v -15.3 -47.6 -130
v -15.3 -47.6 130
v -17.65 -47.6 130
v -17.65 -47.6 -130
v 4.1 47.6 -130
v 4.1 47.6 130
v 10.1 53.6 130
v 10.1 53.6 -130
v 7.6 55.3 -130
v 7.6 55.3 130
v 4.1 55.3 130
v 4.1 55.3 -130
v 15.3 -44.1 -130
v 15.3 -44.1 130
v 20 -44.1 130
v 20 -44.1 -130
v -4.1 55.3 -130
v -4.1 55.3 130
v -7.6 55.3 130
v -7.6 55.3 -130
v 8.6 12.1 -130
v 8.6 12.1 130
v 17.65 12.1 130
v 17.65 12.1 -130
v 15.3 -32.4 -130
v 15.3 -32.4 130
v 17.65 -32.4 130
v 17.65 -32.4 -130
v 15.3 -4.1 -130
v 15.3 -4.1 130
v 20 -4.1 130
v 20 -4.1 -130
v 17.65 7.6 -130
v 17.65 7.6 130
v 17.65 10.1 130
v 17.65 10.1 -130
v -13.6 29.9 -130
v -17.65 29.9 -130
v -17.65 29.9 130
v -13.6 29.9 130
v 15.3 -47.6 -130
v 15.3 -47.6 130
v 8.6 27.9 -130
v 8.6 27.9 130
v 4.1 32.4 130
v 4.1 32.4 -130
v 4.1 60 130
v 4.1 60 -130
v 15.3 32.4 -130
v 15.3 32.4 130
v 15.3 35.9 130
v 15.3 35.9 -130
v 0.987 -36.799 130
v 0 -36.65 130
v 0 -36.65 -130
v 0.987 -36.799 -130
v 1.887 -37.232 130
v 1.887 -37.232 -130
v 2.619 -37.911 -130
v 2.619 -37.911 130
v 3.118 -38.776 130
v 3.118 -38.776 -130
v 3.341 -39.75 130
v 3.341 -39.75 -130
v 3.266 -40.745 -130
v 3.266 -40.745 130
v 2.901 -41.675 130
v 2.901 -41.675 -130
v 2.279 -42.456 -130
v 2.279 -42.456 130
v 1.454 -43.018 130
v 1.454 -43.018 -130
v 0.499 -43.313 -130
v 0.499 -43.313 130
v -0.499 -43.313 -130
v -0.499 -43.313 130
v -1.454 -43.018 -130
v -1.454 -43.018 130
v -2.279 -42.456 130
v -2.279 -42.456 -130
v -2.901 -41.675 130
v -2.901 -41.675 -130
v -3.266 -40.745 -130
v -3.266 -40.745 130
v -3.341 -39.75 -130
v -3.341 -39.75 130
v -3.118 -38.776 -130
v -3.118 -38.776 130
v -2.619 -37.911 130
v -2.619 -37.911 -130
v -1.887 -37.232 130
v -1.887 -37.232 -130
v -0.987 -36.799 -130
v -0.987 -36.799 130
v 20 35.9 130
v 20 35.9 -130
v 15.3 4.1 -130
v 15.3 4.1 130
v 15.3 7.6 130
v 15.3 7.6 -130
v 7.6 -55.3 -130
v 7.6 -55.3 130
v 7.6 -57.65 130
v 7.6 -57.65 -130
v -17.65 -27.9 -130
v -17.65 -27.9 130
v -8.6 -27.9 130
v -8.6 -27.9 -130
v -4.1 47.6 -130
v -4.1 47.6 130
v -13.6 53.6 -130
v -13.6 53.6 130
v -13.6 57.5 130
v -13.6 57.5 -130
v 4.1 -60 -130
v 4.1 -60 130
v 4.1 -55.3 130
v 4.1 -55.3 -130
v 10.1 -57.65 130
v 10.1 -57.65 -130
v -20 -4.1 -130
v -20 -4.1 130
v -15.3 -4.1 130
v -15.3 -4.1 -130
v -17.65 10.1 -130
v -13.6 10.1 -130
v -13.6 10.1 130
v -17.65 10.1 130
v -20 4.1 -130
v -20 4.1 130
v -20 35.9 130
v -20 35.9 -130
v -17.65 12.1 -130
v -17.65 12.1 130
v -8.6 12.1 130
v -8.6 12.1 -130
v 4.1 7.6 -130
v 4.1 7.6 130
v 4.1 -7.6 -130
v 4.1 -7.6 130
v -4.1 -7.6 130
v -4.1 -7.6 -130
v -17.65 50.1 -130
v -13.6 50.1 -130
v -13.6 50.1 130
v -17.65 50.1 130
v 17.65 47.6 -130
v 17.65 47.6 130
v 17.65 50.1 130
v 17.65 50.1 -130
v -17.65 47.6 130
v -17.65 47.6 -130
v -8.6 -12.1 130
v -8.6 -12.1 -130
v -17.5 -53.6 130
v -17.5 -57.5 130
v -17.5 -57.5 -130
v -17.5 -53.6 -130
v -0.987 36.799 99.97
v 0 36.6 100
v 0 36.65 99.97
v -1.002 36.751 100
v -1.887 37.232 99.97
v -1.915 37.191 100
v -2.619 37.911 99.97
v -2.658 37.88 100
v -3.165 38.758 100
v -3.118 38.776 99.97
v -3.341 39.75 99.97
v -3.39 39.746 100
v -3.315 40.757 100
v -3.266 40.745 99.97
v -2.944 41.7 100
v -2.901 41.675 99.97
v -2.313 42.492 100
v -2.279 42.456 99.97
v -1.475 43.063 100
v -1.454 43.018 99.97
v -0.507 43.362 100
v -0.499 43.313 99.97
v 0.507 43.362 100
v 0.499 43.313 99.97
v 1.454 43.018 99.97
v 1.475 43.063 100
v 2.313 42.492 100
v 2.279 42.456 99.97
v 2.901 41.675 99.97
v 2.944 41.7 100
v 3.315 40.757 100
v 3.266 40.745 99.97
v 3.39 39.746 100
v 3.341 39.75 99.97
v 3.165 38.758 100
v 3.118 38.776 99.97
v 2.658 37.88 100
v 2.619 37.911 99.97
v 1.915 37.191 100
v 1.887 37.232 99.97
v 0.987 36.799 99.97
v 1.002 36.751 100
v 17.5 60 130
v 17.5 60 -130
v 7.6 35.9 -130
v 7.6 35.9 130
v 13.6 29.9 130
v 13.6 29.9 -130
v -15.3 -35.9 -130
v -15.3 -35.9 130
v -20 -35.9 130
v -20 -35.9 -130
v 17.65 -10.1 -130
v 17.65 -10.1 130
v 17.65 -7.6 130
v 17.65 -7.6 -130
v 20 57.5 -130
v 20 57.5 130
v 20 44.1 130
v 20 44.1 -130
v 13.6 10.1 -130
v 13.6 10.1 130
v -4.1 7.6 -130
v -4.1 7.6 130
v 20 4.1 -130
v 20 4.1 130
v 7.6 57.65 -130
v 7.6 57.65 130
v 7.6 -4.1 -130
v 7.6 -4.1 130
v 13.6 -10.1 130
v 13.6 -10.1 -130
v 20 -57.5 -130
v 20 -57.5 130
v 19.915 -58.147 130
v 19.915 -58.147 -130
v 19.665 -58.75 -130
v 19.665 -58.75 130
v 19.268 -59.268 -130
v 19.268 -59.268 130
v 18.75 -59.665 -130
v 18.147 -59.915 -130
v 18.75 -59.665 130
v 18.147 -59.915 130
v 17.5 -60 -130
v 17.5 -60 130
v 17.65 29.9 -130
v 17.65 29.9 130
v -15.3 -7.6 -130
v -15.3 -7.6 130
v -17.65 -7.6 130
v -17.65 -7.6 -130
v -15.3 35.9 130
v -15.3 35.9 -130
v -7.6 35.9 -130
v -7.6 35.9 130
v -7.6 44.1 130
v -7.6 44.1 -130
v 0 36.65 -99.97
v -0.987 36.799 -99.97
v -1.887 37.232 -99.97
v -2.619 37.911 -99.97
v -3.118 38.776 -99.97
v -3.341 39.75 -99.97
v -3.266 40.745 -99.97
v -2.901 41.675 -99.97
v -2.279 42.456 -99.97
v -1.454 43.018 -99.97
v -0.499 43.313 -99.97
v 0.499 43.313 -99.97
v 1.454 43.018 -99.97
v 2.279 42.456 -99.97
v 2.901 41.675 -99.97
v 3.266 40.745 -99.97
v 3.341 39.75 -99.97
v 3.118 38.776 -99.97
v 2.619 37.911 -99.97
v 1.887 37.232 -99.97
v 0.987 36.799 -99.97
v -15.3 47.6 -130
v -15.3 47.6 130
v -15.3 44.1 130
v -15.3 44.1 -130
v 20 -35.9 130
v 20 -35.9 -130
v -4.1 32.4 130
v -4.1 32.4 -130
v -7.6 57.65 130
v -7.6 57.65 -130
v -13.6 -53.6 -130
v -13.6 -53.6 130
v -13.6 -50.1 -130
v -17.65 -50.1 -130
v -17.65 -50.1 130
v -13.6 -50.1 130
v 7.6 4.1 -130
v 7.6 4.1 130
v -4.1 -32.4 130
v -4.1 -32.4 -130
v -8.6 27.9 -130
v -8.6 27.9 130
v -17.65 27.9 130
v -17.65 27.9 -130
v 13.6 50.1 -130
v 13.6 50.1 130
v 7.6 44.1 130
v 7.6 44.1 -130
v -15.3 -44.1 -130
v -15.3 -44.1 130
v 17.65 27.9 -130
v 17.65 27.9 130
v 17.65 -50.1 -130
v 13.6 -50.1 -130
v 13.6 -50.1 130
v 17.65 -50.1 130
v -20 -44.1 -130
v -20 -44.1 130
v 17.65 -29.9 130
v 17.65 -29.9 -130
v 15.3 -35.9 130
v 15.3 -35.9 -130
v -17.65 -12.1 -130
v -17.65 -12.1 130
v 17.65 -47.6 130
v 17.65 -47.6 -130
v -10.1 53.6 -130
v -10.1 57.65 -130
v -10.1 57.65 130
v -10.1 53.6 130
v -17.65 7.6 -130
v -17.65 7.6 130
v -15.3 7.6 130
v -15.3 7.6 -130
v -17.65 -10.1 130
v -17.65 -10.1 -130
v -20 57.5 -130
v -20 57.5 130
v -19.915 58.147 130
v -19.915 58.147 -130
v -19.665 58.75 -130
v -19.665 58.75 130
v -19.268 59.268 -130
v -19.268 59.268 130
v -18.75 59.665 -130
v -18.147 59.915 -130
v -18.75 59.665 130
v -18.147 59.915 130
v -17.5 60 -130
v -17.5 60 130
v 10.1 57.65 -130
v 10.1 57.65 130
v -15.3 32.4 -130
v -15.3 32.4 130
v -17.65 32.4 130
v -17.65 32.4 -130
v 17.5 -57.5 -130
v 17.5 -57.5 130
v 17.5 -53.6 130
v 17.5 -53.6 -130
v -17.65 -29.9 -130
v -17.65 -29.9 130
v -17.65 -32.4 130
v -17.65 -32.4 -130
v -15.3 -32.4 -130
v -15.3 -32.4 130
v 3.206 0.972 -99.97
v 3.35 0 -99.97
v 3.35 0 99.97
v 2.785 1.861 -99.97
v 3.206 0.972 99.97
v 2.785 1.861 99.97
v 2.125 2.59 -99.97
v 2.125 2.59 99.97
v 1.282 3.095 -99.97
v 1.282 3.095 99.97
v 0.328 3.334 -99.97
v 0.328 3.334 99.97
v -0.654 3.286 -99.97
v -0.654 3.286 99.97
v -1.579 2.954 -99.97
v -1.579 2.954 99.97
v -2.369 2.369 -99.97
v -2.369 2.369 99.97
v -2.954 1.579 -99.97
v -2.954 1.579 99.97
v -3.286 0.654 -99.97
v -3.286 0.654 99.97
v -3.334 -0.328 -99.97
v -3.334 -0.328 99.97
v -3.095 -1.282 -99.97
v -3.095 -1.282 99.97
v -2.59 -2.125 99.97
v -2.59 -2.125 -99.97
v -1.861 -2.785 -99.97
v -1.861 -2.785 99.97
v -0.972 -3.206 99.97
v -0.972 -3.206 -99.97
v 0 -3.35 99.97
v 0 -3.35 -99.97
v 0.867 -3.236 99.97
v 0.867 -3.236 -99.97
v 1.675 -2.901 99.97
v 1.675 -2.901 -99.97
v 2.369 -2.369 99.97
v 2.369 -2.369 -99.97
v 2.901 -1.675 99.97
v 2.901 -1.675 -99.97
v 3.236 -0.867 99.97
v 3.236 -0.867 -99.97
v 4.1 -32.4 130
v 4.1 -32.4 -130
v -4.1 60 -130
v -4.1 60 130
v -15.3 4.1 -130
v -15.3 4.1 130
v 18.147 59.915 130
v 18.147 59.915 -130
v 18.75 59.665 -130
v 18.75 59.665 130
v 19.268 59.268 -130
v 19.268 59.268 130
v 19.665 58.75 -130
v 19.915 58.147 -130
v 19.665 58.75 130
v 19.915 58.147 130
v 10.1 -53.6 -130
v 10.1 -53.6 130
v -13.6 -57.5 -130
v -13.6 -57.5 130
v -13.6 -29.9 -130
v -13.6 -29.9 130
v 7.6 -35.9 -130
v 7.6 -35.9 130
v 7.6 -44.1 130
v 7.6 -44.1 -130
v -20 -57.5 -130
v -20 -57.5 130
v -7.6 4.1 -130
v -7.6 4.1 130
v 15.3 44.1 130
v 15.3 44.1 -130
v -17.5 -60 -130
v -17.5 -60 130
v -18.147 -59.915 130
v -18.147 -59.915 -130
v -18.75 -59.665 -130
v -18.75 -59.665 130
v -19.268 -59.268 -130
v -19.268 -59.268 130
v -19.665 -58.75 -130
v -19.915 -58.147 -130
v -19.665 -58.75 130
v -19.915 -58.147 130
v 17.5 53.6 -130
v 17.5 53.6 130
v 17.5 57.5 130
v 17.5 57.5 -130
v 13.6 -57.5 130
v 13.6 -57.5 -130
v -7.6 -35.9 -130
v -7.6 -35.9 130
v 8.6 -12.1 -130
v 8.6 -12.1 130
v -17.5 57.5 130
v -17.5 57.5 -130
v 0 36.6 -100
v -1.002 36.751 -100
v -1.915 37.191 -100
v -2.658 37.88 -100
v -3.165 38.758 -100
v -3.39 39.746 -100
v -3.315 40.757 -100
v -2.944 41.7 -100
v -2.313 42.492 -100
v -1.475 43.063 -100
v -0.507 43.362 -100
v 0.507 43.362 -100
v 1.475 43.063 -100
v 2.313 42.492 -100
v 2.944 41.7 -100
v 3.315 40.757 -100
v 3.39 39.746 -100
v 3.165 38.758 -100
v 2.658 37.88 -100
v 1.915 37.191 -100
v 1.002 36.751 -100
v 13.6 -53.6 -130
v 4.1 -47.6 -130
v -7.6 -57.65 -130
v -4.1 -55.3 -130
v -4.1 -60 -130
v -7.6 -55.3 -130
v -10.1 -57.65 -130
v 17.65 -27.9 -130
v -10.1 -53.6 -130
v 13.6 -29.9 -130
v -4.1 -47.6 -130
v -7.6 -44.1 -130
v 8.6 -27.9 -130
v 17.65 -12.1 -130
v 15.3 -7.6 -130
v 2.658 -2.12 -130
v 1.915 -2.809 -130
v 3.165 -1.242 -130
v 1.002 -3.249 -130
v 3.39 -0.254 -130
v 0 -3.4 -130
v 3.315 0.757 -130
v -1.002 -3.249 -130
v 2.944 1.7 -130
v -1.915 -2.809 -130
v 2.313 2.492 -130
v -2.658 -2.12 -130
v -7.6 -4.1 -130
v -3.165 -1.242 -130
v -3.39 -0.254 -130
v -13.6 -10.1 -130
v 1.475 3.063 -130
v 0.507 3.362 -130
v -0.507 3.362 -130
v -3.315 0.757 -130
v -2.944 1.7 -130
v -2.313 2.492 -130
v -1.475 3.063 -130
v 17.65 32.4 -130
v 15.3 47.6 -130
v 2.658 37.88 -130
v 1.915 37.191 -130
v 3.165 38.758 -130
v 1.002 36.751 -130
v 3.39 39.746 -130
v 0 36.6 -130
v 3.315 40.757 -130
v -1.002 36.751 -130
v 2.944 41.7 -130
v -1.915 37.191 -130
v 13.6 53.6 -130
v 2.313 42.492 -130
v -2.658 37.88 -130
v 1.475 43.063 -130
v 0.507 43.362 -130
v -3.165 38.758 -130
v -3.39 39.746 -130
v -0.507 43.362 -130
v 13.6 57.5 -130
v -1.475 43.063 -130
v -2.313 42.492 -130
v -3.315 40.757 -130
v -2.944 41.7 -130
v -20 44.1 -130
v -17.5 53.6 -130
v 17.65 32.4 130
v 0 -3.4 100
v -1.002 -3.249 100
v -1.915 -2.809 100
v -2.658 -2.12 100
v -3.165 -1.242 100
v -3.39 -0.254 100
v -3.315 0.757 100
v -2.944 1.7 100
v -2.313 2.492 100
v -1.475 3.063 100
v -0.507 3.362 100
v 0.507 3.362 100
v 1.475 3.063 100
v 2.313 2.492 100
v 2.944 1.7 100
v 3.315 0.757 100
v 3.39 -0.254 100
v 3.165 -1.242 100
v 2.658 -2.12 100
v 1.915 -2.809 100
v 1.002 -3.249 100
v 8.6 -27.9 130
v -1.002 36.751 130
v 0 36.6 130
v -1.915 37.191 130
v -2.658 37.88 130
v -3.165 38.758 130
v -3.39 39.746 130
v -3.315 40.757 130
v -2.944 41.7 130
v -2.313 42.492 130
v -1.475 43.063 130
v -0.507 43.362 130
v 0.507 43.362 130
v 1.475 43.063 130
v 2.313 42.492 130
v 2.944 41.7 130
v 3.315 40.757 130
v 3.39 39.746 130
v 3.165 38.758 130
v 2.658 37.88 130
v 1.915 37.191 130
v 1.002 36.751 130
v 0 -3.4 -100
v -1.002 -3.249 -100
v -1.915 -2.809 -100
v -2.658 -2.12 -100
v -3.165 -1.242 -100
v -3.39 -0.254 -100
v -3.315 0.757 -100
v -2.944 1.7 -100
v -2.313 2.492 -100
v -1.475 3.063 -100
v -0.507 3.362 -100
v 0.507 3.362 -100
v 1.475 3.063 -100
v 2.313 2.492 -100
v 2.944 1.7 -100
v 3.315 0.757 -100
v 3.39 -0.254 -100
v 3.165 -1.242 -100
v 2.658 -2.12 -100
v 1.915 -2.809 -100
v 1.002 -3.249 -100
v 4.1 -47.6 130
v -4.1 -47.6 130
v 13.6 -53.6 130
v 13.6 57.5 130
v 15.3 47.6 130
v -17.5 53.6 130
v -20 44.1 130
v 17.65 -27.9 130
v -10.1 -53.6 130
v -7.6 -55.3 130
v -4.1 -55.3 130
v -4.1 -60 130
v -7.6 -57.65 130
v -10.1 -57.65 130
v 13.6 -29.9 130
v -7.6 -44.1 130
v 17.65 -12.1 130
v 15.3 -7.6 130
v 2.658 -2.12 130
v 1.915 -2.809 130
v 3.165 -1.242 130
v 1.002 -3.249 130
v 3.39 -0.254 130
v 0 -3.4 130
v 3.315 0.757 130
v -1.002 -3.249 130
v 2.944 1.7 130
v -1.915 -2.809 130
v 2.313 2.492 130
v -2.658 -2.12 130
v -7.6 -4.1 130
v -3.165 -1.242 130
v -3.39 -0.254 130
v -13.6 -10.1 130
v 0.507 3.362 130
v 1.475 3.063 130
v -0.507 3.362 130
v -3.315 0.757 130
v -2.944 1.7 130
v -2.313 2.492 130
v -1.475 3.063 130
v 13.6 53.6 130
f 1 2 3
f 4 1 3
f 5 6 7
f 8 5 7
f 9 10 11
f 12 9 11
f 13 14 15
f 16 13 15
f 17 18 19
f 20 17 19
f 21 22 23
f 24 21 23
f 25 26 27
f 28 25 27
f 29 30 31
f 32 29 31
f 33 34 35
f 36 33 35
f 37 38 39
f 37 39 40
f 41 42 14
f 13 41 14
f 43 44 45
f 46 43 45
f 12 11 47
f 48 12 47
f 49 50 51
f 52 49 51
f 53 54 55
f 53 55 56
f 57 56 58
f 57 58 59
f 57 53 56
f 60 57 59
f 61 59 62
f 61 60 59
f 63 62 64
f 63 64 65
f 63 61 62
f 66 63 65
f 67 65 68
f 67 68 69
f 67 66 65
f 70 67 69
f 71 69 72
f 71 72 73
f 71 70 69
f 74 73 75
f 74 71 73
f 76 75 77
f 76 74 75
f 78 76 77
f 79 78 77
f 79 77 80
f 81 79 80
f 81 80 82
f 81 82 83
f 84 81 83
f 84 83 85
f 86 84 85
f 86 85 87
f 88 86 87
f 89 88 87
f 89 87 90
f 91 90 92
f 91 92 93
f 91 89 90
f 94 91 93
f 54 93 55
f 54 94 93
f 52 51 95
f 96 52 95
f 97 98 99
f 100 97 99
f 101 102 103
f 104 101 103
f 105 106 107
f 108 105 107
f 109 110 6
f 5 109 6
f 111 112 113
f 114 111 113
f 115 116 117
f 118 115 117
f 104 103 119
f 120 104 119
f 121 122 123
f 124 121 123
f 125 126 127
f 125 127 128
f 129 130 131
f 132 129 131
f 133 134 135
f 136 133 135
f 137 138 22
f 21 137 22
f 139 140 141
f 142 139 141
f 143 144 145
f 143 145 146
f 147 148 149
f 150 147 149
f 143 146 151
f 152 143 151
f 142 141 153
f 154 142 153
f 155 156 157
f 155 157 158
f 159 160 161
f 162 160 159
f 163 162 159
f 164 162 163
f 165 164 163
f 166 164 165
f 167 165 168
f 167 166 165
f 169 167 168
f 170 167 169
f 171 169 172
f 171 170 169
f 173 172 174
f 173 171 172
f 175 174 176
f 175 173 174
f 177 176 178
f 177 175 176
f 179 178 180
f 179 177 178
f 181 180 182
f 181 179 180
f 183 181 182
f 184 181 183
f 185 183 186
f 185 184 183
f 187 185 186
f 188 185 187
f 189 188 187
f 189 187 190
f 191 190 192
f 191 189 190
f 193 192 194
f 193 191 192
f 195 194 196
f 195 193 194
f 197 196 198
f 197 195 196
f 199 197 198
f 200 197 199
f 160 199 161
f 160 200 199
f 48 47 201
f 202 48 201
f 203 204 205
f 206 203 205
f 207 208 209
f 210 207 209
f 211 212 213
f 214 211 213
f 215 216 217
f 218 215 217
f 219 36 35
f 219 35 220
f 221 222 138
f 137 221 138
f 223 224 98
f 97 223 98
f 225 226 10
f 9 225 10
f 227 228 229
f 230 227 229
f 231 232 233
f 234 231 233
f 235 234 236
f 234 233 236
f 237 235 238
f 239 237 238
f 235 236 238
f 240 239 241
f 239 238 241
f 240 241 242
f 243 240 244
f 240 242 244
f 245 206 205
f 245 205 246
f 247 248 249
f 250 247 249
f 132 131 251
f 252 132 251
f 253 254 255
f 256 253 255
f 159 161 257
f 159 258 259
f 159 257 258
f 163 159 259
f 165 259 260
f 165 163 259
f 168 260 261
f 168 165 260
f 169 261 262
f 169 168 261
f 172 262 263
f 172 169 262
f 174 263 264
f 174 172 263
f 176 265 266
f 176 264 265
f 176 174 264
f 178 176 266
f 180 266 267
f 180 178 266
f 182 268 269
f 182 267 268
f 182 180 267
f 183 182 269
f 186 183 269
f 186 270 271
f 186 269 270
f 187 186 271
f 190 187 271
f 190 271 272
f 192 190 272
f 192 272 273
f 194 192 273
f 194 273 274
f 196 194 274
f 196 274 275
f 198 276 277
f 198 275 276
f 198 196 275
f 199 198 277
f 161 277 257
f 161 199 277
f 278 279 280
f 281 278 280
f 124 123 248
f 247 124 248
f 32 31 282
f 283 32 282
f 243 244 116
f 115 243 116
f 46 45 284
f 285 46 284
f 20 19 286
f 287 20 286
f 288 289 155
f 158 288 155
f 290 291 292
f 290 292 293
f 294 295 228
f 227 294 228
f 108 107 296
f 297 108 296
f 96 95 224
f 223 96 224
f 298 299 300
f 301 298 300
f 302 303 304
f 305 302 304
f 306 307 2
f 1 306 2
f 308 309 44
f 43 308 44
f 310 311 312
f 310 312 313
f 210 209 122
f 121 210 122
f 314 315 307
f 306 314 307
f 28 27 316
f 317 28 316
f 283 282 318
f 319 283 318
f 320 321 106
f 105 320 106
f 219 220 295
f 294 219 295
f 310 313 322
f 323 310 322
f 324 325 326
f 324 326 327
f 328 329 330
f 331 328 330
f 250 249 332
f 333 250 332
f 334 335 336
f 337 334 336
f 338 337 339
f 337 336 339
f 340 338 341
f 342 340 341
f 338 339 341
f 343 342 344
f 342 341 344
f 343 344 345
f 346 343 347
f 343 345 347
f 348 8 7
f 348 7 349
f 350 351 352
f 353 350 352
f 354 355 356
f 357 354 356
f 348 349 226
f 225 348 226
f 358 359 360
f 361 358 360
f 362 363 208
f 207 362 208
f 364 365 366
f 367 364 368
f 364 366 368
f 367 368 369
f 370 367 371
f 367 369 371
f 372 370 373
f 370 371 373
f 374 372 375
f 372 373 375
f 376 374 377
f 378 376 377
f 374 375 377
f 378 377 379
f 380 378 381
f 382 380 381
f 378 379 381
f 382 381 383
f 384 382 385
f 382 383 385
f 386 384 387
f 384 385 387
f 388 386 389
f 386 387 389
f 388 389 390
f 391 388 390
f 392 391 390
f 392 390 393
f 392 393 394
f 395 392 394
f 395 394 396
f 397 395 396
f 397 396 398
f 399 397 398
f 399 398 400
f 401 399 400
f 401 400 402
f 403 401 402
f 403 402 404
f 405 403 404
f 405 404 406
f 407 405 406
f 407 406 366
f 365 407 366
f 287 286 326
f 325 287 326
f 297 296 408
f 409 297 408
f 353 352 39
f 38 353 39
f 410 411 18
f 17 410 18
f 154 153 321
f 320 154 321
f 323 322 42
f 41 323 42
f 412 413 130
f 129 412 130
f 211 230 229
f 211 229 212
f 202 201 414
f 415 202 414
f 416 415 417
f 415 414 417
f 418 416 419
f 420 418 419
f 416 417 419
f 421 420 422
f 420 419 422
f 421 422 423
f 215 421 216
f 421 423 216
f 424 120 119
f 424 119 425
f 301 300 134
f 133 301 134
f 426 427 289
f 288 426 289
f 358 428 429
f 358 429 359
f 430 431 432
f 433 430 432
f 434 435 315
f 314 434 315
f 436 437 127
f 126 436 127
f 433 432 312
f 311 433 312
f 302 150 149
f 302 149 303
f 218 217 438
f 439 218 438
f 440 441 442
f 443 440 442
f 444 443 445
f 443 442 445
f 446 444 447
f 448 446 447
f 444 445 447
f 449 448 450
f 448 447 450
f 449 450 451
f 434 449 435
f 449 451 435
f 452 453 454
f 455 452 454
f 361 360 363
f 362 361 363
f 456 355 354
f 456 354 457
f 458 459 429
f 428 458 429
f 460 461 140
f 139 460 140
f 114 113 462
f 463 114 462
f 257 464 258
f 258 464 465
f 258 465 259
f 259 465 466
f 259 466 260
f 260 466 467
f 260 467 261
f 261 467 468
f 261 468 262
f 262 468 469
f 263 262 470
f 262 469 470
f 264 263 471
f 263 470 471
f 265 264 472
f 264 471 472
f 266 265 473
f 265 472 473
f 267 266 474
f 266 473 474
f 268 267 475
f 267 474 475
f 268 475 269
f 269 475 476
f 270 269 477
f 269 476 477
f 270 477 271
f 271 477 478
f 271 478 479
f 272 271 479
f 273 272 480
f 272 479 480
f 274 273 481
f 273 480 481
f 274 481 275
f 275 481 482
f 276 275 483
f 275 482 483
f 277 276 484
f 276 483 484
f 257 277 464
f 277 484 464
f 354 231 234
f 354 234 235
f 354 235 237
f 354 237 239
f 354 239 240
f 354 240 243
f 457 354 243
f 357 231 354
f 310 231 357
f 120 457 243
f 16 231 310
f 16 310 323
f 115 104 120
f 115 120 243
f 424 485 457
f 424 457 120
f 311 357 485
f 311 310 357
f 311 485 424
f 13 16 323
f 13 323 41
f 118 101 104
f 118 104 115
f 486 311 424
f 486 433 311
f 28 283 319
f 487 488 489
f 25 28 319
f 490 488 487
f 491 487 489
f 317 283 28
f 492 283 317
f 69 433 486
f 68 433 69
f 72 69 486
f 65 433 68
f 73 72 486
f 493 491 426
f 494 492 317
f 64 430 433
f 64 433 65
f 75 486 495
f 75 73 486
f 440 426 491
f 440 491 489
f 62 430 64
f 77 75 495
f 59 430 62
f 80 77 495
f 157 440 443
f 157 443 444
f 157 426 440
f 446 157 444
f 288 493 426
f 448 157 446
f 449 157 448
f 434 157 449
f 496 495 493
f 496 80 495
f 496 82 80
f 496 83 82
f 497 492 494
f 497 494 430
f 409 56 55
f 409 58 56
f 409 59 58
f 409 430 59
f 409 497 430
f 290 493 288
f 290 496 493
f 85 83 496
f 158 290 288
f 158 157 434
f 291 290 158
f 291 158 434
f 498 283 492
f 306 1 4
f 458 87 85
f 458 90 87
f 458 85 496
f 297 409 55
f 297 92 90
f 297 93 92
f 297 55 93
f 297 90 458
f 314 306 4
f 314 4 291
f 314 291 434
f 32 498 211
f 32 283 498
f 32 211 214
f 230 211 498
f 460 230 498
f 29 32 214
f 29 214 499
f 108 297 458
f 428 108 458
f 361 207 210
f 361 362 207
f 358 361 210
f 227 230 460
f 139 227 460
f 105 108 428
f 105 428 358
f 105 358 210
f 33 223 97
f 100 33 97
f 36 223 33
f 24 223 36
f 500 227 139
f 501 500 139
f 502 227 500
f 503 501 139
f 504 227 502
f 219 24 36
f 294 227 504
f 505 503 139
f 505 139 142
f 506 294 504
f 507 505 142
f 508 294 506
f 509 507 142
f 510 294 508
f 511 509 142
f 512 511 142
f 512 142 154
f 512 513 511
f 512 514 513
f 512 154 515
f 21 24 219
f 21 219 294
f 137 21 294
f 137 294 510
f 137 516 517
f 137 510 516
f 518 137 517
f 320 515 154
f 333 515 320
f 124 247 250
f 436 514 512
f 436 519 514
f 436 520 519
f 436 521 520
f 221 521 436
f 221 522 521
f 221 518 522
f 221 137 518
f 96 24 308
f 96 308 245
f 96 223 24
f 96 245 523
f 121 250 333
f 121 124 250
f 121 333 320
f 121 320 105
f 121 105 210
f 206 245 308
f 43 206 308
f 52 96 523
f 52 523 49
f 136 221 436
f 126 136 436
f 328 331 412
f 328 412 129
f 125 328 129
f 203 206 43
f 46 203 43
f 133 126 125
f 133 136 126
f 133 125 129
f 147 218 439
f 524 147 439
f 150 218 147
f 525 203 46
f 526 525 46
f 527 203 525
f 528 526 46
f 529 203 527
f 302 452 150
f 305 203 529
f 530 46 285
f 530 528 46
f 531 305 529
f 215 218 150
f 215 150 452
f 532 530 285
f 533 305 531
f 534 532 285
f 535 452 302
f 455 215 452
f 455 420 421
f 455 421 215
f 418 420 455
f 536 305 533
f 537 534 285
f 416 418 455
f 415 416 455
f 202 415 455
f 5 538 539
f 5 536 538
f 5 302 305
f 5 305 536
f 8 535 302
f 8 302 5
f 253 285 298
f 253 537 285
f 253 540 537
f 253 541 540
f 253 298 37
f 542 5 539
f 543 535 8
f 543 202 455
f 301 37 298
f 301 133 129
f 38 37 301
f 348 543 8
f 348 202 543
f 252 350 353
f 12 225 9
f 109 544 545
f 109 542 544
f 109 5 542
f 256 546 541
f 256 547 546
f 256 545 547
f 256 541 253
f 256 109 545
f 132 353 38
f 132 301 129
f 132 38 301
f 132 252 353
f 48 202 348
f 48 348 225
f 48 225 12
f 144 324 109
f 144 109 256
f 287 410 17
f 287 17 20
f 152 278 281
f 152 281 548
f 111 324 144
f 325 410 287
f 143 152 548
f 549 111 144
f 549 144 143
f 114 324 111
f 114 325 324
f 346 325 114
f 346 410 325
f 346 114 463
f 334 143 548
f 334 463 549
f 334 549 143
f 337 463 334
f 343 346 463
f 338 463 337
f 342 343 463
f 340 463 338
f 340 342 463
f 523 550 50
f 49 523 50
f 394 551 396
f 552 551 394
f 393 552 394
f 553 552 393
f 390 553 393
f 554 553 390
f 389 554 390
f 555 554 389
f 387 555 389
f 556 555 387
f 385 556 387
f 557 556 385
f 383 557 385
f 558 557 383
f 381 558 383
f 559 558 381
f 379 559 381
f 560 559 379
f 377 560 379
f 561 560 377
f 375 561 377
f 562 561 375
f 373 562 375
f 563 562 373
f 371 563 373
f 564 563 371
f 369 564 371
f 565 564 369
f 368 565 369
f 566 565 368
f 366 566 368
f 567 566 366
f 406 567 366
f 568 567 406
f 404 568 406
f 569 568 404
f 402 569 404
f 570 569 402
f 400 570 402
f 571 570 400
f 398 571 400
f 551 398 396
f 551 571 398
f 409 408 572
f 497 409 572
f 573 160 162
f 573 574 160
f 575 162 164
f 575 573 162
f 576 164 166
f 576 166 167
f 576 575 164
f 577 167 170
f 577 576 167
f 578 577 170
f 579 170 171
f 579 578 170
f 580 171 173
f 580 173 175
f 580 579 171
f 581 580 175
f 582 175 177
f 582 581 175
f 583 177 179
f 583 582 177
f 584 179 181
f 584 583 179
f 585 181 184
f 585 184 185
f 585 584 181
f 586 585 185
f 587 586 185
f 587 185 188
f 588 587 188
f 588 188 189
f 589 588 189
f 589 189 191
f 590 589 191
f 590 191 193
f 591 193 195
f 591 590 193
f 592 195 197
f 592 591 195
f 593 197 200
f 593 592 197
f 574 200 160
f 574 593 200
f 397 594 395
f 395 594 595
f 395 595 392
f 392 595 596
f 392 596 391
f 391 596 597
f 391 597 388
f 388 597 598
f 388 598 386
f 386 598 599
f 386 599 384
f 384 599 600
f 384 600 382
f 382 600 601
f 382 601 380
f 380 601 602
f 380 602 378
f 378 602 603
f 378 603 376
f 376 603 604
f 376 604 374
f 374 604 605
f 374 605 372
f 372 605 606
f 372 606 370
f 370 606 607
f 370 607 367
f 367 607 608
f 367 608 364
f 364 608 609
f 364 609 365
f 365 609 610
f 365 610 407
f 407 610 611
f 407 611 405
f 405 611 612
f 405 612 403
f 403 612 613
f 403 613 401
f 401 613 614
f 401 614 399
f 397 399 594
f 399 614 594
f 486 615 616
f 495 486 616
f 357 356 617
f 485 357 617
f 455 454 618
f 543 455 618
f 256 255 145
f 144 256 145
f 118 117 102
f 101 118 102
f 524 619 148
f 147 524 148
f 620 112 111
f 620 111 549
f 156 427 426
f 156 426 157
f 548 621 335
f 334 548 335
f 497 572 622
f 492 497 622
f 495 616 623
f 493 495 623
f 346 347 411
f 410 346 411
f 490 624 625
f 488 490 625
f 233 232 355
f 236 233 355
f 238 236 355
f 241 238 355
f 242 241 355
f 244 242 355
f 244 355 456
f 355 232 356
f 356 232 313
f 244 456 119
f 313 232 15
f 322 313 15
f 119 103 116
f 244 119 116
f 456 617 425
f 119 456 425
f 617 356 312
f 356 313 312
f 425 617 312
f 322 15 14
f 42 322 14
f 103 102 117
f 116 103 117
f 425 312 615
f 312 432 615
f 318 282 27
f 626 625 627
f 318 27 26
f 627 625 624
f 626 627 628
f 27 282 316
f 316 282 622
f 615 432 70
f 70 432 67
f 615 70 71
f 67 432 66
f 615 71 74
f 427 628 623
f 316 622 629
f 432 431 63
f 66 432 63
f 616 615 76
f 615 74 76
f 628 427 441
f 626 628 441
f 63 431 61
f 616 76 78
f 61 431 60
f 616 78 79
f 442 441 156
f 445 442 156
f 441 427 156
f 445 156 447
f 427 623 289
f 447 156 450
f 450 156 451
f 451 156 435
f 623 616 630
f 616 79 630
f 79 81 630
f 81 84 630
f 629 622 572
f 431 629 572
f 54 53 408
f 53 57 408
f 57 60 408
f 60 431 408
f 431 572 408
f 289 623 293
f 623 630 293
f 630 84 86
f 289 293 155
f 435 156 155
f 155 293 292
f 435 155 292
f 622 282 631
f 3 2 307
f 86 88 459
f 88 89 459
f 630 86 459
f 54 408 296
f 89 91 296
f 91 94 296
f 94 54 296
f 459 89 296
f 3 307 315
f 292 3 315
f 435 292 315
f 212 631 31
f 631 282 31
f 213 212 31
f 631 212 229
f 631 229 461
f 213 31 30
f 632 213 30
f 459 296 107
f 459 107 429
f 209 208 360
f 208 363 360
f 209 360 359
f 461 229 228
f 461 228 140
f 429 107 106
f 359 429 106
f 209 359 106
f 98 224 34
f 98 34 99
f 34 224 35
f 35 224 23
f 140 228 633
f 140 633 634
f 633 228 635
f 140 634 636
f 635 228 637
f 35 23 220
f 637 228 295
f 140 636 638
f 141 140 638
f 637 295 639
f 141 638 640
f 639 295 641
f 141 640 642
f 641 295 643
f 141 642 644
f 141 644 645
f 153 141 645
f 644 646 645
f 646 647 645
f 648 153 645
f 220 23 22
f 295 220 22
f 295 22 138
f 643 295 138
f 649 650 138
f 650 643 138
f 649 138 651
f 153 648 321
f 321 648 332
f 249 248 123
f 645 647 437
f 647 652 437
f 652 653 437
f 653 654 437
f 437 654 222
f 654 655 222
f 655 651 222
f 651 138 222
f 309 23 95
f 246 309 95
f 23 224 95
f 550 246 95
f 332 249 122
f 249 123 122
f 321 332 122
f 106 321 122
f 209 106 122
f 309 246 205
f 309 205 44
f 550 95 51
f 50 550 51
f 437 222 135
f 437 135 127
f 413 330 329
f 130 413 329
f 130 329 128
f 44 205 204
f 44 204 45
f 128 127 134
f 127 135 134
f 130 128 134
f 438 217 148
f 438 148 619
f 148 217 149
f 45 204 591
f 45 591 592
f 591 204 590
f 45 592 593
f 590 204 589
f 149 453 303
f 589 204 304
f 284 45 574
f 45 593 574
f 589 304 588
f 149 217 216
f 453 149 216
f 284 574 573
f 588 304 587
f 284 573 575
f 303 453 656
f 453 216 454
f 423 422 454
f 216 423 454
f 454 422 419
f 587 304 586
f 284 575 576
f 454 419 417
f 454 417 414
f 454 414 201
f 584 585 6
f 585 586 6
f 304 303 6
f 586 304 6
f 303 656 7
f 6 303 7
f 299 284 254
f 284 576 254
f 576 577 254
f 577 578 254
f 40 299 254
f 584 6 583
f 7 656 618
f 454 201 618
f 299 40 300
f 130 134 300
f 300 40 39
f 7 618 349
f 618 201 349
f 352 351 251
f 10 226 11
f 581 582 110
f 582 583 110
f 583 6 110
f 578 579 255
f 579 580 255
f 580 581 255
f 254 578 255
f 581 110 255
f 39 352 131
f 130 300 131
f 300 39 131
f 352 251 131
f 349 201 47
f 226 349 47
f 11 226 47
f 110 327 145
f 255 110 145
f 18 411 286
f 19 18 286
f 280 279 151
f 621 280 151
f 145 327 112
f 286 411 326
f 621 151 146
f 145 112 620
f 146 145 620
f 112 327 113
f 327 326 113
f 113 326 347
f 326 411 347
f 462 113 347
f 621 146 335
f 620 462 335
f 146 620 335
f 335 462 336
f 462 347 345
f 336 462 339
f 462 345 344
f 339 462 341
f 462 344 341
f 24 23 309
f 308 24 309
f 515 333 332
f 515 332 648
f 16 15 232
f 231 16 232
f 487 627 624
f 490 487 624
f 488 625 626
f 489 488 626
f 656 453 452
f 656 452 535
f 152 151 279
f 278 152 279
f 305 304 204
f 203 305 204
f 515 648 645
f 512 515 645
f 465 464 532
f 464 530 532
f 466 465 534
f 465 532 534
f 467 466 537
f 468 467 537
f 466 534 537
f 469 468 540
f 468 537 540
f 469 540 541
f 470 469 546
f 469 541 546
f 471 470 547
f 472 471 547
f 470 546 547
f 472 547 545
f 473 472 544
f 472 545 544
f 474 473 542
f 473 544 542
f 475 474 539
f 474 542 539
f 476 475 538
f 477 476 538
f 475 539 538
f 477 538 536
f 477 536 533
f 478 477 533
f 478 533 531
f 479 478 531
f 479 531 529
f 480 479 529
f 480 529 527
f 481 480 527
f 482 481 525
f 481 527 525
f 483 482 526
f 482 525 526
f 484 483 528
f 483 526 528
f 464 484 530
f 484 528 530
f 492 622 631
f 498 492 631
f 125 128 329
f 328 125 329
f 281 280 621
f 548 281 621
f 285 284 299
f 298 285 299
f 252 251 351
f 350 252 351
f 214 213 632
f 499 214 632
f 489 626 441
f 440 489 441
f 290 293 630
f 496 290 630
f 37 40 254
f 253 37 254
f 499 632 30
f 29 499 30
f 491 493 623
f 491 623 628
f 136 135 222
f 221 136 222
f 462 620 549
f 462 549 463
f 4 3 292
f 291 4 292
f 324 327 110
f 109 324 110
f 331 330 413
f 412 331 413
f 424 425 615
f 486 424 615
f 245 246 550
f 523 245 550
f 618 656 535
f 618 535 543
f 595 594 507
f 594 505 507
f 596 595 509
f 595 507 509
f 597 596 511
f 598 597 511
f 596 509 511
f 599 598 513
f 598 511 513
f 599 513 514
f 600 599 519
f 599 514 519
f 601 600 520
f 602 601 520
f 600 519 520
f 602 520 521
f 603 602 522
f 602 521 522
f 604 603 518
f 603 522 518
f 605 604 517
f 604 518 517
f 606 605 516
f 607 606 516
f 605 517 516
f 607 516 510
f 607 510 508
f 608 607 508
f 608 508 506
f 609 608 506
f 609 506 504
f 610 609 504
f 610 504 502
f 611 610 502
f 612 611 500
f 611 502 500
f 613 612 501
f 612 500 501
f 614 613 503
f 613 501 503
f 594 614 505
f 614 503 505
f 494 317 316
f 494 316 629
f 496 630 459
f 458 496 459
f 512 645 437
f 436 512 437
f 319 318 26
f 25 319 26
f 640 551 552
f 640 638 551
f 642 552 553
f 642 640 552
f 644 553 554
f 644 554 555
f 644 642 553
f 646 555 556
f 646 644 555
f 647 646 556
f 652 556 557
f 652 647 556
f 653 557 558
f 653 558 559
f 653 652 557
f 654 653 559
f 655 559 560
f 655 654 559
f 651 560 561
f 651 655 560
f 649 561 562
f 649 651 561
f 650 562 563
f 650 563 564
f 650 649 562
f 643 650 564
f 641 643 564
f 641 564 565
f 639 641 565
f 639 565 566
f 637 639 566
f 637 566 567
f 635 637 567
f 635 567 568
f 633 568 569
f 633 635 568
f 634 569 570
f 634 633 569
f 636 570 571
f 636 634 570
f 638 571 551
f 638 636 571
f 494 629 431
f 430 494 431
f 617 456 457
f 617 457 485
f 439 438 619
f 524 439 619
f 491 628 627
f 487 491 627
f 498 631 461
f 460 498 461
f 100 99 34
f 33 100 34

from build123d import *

# Parameters (mm, degrees)
SKETCH22_W                      = 3.9
SKETCH22_H                      = 3.9
F_40_SERIES_TS40_120LM_1_DEPTH  = 260
M8X1_25_TAPPED_HOLE1_AT_2_COUNT = 2
M8X1_25_TAPPED_HOLE1_AT_2_PITCH = 40


with BuildPart() as part:
    # Sketch22 → 40 series TS40-120LM(1) (new body)
    with BuildSketch(Plane(origin=(0, 0, 130), x_dir=(-1, 0, 0), z_dir=(0, 0, -1))):
        with BuildLine():
            Line((15.3, -35.9), (20, -35.9))
            Line((20, -35.9), (20, -4.1))
            Line((20, -4.1), (15.3, -4.1))
            Line((15.3, -4.1), (15.3, -7.6))
            Line((15.3, -7.6), (17.65, -7.6))
            Line((17.65, -7.6), (17.65, -10.1))
            Line((17.65, -10.1), (13.6, -10.1))
            Line((13.6, -10.1), (7.6, -4.1))
            Line((7.6, -4.1), (7.6, 4.1))
            Line((7.6, 4.1), (13.6, 10.1))
            Line((13.6, 10.1), (17.65, 10.1))
            Line((17.65, 10.1), (17.65, 7.6))
            Line((17.65, 7.6), (15.3, 7.6))
            Line((15.3, 7.6), (15.3, 4.1))
            Line((15.3, 4.1), (20, 4.1))
            Line((20, 4.1), (20, 35.9))
            Line((20, 35.9), (15.3, 35.9))
            Line((15.3, 35.9), (15.3, 32.4))
            Line((15.3, 32.4), (17.65, 32.4))
            Line((17.65, 32.4), (17.65, 29.9))
            Line((17.65, 29.9), (13.6, 29.9))
            Line((13.6, 29.9), (7.6, 35.9))
            Line((7.6, 35.9), (7.6, 44.1))
            Line((7.6, 44.1), (13.6, 50.1))
            Line((13.6, 50.1), (17.65, 50.1))
            Line((17.65, 50.1), (17.65, 47.6))
            Line((17.65, 47.6), (15.3, 47.6))
            Line((15.3, 47.6), (15.3, 44.1))
            Line((15.3, 44.1), (20, 44.1))
            Line((20, 44.1), (20, 57.5))
            ThreePointArc((20, 57.5), (19.267766953, 59.267766953), (17.5, 60))
            Line((17.5, 60), (4.1, 60))
            Line((4.1, 60), (4.1, 55.3))
            Line((4.1, 55.3), (7.6, 55.3))
            Line((7.6, 55.3), (7.6, 57.65))
            Line((7.6, 57.65), (10.1, 57.65))
            Line((10.1, 57.65), (10.1, 53.6))
            Line((10.1, 53.6), (4.1, 47.6))
            Line((4.1, 47.6), (-4.1, 47.6))
            Line((-4.1, 47.6), (-10.1, 53.6))
            Line((-10.1, 53.6), (-10.1, 57.65))
            Line((-10.1, 57.65), (-7.6, 57.65))
            Line((-7.6, 57.65), (-7.6, 55.3))
            Line((-7.6, 55.3), (-4.1, 55.3))
            Line((-4.1, 55.3), (-4.1, 60))
            Line((-4.1, 60), (-17.5, 60))
            ThreePointArc((-17.5, 60), (-19.267766953, 59.267766953), (-20, 57.5))
            Line((-20, 57.5), (-20, 44.1))
            Line((-20, 44.1), (-15.3, 44.1))
            Line((-15.3, 44.1), (-15.3, 47.6))
            Line((-15.3, 47.6), (-17.65, 47.6))
            Line((-17.65, 47.6), (-17.65, 50.1))
            Line((-17.65, 50.1), (-13.6, 50.1))
            Line((-13.6, 50.1), (-7.6, 44.1))
            Line((-7.6, 44.1), (-7.6, 35.9))
            Line((-7.6, 35.9), (-13.6, 29.9))
            Line((-13.6, 29.9), (-17.65, 29.9))
            Line((-17.65, 29.9), (-17.65, 32.4))
            Line((-17.65, 32.4), (-15.3, 32.4))
            Line((-15.3, 32.4), (-15.3, 35.9))
            Line((-15.3, 35.9), (-20, 35.9))
            Line((-20, 35.9), (-20, 4.1))
            Line((-20, 4.1), (-15.3, 4.1))
            Line((-15.3, 4.1), (-15.3, 7.6))
            Line((-15.3, 7.6), (-17.65, 7.6))
            Line((-17.65, 7.6), (-17.65, 10.1))
            Line((-17.65, 10.1), (-13.6, 10.1))
            Line((-13.6, 10.1), (-7.6, 4.1))
            Line((-7.6, 4.1), (-7.6, -4.1))
            Line((-7.6, -4.1), (-13.6, -10.1))
            Line((-13.6, -10.1), (-17.65, -10.1))
            Line((-17.65, -10.1), (-17.65, -7.6))
            Line((-17.65, -7.6), (-15.3, -7.6))
            Line((-15.3, -7.6), (-15.3, -4.1))
            Line((-15.3, -4.1), (-20, -4.1))
            Line((-20, -4.1), (-20, -35.9))
            Line((-20, -35.9), (-15.3, -35.9))
            Line((-15.3, -35.9), (-15.3, -32.4))
            Line((-15.3, -32.4), (-17.65, -32.4))
            Line((-17.65, -32.4), (-17.65, -29.9))
            Line((-17.65, -29.9), (-13.6, -29.9))
            Line((-13.6, -29.9), (-7.6, -35.9))
            Line((-7.6, -35.9), (-7.6, -44.1))
            Line((-7.6, -44.1), (-13.6, -50.1))
            Line((-13.6, -50.1), (-17.65, -50.1))
            Line((-17.65, -50.1), (-17.65, -47.6))
            Line((-17.65, -47.6), (-15.3, -47.6))
            Line((-15.3, -47.6), (-15.3, -44.1))
            Line((-15.3, -44.1), (-20, -44.1))
            Line((-20, -44.1), (-20, -57.5))
            ThreePointArc((-20, -57.5), (-19.267766953, -59.267766953), (-17.5, -60))
            Line((-17.5, -60), (-4.1, -60))
            Line((-4.1, -60), (-4.1, -55.3))
            Line((-4.1, -55.3), (-7.6, -55.3))
            Line((-7.6, -55.3), (-7.6, -57.65))
            Line((-7.6, -57.65), (-10.1, -57.65))
            Line((-10.1, -57.65), (-10.1, -53.6))
            Line((-10.1, -53.6), (-4.1, -47.6))
            Line((-4.1, -47.6), (4.1, -47.6))
            Line((4.1, -47.6), (10.1, -53.6))
            Line((10.1, -53.6), (10.1, -57.65))
            Line((10.1, -57.65), (7.6, -57.65))
            Line((7.6, -57.65), (7.6, -55.3))
            Line((7.6, -55.3), (4.1, -55.3))
            Line((4.1, -55.3), (4.1, -60))
            Line((4.1, -60), (17.5, -60))
            ThreePointArc((17.5, -60), (19.267766953, -59.267766953), (20, -57.5))
            Line((20, -57.5), (20, -44.1))
            Line((20, -44.1), (15.3, -44.1))
            Line((15.3, -44.1), (15.3, -47.6))
            Line((15.3, -47.6), (17.65, -47.6))
            Line((17.65, -47.6), (17.65, -50.1))
            Line((17.65, -50.1), (13.6, -50.1))
            Line((13.6, -50.1), (7.6, -44.1))
            Line((7.6, -44.1), (7.6, -35.9))
            Line((7.6, -35.9), (13.6, -29.9))
            Line((13.6, -29.9), (17.65, -29.9))
            Line((17.65, -29.9), (17.65, -32.4))
            Line((17.65, -32.4), (15.3, -32.4))
            Line((15.3, -32.4), (15.3, -35.9))
        make_face()
        Polygon((-4.1, -7.6), (4.1, -7.6), (8.6, -12.1), (17.65, -12.1), (17.65, -27.9), (8.6, -27.9), (4.1, -32.4), (-4.1, -32.4), (-8.6, -27.9), (-17.65, -27.9), (-17.65, -12.1), (-8.6, -12.1), align=None, mode=Mode.SUBTRACT)
        Polygon((-4.1, 7.6), (-8.6, 12.1), (-17.65, 12.1), (-17.65, 27.9), (-8.6, 27.9), (-4.1, 32.4), (4.1, 32.4), (8.6, 27.9), (17.65, 27.9), (17.65, 12.1), (8.6, 12.1), (4.1, 7.6), align=None, mode=Mode.SUBTRACT)
        with Locations((15.55, -55.55)):
            Rectangle(SKETCH22_W, SKETCH22_H, mode=Mode.SUBTRACT)
        with Locations((-15.55, -55.55)):
            Rectangle(SKETCH22_W, SKETCH22_H, mode=Mode.SUBTRACT)
        with Locations((-15.55, 55.55)):
            Rectangle(SKETCH22_W, SKETCH22_H, mode=Mode.SUBTRACT)
        with Locations((15.55, 55.55)):
            Rectangle(SKETCH22_W, SKETCH22_H, mode=Mode.SUBTRACT)
        with BuildLine():
            ThreePointArc((0, -43.35), (3.35, -40), (0, -36.65))
            ThreePointArc((0, -36.65), (-3.35, -40), (0, -43.35))
        make_face(mode=Mode.SUBTRACT)
        with BuildLine():
            ThreePointArc((3.35, 0), (0, -3.35), (-3.35, 0))
            ThreePointArc((-3.35, 0), (0, 3.35), (3.35, 0))
        make_face(mode=Mode.SUBTRACT)
        with BuildLine():
            ThreePointArc((0, 43.35), (-3.35, 40), (0, 36.65))
            ThreePointArc((0, 36.65), (3.35, 40), (0, 43.35))
        make_face(mode=Mode.SUBTRACT)
    extrude(amount=F_40_SERIES_TS40_120LM_1_DEPTH)

    # Sketch4 → M8x1.25 Tapped Hole1 (revolve, cut)
    with BuildSketch(Plane(origin=(0, 0, 130), x_dir=(0, -1, 0), z_dir=(1, 0, 0))):
        Polygon((0, 0), (0, 32.042926105), (3.4, 30), (3.4, 0), align=None)
    m8x1_25_tapped_hole1 = revolve(axis=Axis((0, 0, 136.35), (0, 0, -1)), mode=Mode.SUBTRACT)

    # M8x1.25 Tapped Hole1 at 2: M8x1.25 Tapped Hole1 ×2
    with Locations(*[(0, i * M8X1_25_TAPPED_HOLE1_AT_2_PITCH, 0) for i in range(1, M8X1_25_TAPPED_HOLE1_AT_2_COUNT)]):
        add(m8x1_25_tapped_hole1, mode=Mode.SUBTRACT)

    # Mirror1: M8x1.25 Tapped Hole1 across plane
    add(m8x1_25_tapped_hole1.mirror(Plane.XY), mode=Mode.SUBTRACT)

    # Mirror1 copy 1 sketch → Mirror1 copy 1 (revolve, cut)
    with BuildSketch(Plane(origin=(0, 40, -130), x_dir=(0, -1, 0), z_dir=(1, 0, 0))):
        Polygon((0, 0), (0, -32.042926105), (3.4, -30), (3.4, 0), align=None)
    revolve(axis=Axis((0, 40, -136.35), (0, 0, -1)), mode=Mode.SUBTRACT)


solid = part.part
